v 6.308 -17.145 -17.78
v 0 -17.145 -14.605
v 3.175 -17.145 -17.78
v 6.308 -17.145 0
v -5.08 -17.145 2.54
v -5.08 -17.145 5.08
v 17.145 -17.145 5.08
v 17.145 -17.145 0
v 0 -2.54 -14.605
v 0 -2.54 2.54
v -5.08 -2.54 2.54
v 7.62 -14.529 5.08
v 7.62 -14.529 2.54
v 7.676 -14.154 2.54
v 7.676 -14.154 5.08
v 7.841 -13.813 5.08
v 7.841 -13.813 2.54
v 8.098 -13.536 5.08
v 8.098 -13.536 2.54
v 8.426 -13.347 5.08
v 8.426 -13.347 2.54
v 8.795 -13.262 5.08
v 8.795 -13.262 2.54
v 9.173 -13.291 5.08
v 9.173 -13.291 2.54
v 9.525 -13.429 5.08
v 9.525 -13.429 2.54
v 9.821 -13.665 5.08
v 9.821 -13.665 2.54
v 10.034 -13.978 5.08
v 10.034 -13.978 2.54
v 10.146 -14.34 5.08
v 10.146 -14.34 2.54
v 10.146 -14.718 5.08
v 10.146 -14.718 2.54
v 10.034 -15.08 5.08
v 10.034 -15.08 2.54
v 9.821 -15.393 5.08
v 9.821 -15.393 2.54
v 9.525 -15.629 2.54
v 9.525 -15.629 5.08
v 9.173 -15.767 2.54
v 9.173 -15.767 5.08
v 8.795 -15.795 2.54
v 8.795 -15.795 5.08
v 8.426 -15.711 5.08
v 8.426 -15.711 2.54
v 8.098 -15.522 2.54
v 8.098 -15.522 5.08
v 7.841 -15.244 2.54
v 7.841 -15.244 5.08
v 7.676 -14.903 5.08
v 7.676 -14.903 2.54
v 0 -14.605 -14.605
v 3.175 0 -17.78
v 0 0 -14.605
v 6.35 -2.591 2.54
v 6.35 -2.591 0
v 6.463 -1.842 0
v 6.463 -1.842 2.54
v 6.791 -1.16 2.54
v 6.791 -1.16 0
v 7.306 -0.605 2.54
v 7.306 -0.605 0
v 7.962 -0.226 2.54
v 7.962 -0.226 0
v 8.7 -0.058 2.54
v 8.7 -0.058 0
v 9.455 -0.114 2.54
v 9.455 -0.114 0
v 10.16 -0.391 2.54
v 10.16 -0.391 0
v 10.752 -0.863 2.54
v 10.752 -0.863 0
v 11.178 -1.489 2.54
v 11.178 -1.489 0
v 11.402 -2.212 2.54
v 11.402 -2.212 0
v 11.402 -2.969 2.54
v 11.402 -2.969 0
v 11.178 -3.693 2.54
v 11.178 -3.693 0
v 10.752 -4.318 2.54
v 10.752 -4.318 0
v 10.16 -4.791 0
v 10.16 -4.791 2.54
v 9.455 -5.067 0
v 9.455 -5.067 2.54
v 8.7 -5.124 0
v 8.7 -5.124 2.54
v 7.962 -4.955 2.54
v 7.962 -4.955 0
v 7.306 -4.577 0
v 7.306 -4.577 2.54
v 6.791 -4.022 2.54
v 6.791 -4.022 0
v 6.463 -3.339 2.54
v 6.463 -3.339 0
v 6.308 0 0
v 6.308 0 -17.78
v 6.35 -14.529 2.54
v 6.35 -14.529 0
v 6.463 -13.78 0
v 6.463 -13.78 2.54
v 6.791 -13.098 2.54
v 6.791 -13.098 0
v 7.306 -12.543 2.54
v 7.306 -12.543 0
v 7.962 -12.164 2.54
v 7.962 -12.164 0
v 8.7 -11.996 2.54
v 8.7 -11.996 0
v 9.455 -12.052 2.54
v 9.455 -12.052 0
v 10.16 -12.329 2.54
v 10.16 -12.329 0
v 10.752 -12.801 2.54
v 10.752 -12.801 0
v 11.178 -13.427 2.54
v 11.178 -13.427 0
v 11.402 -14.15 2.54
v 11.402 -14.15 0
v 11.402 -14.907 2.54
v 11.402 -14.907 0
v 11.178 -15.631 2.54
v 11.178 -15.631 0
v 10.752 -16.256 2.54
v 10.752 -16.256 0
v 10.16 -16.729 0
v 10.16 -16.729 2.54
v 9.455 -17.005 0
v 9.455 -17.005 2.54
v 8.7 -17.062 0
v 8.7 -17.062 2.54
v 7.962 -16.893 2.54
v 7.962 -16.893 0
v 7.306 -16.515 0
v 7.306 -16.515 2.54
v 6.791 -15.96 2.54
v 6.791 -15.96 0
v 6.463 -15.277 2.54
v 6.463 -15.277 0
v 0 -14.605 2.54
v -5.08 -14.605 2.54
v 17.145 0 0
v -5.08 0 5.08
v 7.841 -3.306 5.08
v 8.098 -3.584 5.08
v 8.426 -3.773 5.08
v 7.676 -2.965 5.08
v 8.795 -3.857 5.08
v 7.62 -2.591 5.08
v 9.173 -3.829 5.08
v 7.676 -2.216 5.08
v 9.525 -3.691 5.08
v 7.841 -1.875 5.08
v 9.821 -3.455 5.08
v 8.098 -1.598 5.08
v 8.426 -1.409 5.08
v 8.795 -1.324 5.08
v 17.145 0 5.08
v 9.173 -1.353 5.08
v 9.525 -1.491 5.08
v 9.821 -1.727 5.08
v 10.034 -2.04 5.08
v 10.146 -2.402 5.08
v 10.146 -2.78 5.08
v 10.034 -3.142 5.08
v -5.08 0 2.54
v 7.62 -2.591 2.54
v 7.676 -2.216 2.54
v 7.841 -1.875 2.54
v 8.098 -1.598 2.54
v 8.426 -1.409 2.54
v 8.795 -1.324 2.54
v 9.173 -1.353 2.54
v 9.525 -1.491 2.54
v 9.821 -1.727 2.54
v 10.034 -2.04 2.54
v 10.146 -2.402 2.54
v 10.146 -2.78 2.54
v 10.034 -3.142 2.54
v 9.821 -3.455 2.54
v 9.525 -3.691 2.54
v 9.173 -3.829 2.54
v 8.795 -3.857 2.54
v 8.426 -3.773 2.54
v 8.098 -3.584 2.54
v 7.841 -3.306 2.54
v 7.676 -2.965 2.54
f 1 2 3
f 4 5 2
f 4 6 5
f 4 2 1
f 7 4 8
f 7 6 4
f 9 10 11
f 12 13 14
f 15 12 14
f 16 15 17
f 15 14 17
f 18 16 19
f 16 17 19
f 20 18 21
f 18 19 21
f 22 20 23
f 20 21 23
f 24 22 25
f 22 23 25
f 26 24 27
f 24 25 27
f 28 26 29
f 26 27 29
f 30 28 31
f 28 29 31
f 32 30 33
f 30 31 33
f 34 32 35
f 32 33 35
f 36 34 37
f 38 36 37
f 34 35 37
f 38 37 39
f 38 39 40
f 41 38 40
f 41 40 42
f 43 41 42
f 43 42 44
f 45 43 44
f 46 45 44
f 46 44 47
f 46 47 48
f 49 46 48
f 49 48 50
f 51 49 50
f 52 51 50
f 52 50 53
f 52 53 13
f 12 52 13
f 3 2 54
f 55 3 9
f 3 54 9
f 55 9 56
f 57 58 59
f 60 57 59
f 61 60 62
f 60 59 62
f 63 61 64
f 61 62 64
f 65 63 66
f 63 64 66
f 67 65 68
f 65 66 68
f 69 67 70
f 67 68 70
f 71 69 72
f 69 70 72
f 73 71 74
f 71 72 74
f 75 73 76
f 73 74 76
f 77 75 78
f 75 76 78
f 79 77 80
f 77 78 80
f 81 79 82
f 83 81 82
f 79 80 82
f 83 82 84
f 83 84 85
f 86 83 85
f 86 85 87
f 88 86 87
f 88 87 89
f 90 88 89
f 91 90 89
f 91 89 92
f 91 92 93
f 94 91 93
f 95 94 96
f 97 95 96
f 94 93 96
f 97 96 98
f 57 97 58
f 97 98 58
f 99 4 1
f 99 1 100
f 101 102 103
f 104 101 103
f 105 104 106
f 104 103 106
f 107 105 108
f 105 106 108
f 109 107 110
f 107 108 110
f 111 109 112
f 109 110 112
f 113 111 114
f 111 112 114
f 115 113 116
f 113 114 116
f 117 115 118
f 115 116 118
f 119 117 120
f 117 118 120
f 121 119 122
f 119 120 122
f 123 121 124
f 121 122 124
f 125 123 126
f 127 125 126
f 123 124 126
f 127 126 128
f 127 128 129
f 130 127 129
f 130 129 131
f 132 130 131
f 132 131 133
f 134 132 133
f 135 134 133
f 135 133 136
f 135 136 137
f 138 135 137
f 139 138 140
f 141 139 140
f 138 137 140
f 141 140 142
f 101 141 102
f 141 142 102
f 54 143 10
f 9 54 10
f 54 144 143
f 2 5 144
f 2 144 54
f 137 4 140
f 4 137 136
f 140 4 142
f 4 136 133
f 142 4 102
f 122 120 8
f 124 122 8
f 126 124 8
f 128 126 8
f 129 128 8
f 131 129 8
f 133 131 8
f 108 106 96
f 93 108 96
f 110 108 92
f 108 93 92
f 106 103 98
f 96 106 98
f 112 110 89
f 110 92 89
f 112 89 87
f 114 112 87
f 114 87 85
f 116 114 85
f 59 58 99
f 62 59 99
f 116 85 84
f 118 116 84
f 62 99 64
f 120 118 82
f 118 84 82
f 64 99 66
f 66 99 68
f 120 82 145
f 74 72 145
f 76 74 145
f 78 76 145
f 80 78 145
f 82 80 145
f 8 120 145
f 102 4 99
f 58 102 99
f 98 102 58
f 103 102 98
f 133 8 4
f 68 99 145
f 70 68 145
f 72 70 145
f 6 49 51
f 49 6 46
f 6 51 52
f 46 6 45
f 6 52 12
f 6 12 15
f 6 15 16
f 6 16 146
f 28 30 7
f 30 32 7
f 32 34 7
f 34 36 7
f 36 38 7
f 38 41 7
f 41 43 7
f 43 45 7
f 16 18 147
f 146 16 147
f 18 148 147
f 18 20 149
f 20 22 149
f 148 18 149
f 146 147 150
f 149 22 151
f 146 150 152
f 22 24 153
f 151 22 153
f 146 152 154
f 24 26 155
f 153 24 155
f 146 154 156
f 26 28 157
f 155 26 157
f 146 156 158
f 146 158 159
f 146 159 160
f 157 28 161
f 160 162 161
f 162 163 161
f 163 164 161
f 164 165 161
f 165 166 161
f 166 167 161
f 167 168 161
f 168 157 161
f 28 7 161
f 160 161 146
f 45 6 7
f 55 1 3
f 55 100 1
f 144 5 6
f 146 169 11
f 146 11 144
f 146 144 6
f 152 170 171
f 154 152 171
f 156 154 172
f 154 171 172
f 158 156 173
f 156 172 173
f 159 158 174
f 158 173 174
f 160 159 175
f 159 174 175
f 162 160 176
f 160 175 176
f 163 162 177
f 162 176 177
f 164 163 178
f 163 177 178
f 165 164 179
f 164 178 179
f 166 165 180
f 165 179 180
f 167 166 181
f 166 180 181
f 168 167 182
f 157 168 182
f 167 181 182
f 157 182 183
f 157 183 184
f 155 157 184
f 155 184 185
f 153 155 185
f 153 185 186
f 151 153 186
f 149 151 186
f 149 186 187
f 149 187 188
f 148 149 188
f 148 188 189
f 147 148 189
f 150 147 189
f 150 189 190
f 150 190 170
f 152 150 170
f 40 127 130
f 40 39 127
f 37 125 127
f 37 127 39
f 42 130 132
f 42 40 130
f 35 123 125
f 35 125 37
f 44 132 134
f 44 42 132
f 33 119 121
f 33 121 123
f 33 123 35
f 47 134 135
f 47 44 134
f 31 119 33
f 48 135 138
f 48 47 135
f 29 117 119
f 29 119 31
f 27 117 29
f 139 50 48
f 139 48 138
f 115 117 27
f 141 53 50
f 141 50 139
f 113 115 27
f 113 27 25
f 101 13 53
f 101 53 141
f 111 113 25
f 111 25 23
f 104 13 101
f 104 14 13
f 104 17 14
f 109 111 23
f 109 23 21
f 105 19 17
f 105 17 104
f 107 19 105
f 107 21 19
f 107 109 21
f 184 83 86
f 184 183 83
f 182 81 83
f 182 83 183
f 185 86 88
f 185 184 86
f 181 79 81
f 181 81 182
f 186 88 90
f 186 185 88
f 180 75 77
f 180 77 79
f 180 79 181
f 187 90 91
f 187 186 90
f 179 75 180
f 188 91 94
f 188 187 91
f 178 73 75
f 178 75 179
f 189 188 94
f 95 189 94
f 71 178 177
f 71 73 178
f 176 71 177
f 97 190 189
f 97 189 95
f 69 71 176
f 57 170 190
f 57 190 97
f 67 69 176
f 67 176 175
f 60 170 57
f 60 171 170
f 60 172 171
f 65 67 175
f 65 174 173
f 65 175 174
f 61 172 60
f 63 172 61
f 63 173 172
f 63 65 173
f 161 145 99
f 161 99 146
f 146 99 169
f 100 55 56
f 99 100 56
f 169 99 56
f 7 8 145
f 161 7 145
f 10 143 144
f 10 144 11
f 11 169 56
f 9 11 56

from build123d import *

# Parameters (mm, degrees)
SKETCH1_W           = 17.145
SKETCH1_H           = 17.145
BOSS_EXTRUDE1_DEPTH = 5.08
SKETCH2_R           = 1.27
CUT_EXTRUDE1_DEPTH  = 6.08
SKETCH3_R           = 2.54
CUT_EXTRUDE4_DEPTH  = 2.54
SKETCH4_W           = 6.307704678
SKETCH4_H           = 17.145
BOSS_EXTRUDE2_DEPTH = 17.78
SKETCH5_W           = 2.54
SKETCH5_H           = 17.145
BOSS_EXTRUDE3_DEPTH = 5.08
CHAMFER1_SIZE       = 3.175
BOSS_EXTRUDE4_DEPTH = 2.54
BOSS_EXTRUDE5_DEPTH = 2.54


with BuildPart() as part:
    # Sketch1 → Boss-Extrude1 (new body)
    with BuildSketch(Plane.XY):
        with Locations((8.5725, -8.5725)):
            Rectangle(SKETCH1_W, SKETCH1_H)
    extrude(amount=BOSS_EXTRUDE1_DEPTH)

    # Sketch2 → Cut-Extrude1 (cut, through all)
    with BuildSketch(Plane(origin=(0, 0, 0), x_dir=(-1, 0, 0), z_dir=(0, 0, -1))):
        with Locations((-8.89, -2.5908)):
            Circle(SKETCH2_R)
        with Locations((-8.89, -14.5288)):
            Circle(SKETCH2_R)
    extrude(amount=-CUT_EXTRUDE1_DEPTH, mode=Mode.SUBTRACT)

    # Sketch3 → Cut-Extrude4 (cut)
    with BuildSketch(Plane(origin=(0, 0, 0), x_dir=(-1, 0, 0), z_dir=(0, 0, -1))):
        with Locations((-8.89, -2.5908)):
            Circle(SKETCH3_R)
        with Locations((-8.89, -14.5288)):
            Circle(SKETCH3_R)
    extrude(amount=-CUT_EXTRUDE4_DEPTH, mode=Mode.SUBTRACT)

    # Sketch4 → Boss-Extrude2 (add)
    with BuildSketch(Plane(origin=(0, 0, 0), x_dir=(-1, 0, 0), z_dir=(0, 0, -1))):
        with Locations((-3.153852339, -8.5725)):
            Rectangle(SKETCH4_W, SKETCH4_H)
    extrude(amount=BOSS_EXTRUDE2_DEPTH)

    # Sketch5 → Boss-Extrude3 (add)
    with BuildSketch(Plane.ZY):
        with Locations((3.81, -8.5725)):
            Rectangle(SKETCH5_W, SKETCH5_H)
    extrude(amount=BOSS_EXTRUDE3_DEPTH)

    # Chamfer1
    chamfer1_edges = [part.edges().sort_by_distance(p)[0] for p in [
        (0, -8.5725, -17.78),
    ]]
    chamfer(chamfer1_edges, length=CHAMFER1_SIZE)

    # Sketch7 → Boss-Extrude4 (add)
    with BuildSketch(Plane(origin=(0, 0, 0), x_dir=(1, 0, 0), z_dir=(0, 1, 0))):
        Polygon((-5.08, -2.54), (0, 14.605), (0, -2.54), align=None)
    extrude(amount=-BOSS_EXTRUDE4_DEPTH)

    # Sketch8 → Boss-Extrude5 (add)
    with BuildSketch(Plane.XZ.offset(17.145)):
        Polygon((0, 2.54), (-5.08, 2.54), (0, -14.605), align=None)
    extrude(amount=-BOSS_EXTRUDE5_DEPTH)


solid = part.part
